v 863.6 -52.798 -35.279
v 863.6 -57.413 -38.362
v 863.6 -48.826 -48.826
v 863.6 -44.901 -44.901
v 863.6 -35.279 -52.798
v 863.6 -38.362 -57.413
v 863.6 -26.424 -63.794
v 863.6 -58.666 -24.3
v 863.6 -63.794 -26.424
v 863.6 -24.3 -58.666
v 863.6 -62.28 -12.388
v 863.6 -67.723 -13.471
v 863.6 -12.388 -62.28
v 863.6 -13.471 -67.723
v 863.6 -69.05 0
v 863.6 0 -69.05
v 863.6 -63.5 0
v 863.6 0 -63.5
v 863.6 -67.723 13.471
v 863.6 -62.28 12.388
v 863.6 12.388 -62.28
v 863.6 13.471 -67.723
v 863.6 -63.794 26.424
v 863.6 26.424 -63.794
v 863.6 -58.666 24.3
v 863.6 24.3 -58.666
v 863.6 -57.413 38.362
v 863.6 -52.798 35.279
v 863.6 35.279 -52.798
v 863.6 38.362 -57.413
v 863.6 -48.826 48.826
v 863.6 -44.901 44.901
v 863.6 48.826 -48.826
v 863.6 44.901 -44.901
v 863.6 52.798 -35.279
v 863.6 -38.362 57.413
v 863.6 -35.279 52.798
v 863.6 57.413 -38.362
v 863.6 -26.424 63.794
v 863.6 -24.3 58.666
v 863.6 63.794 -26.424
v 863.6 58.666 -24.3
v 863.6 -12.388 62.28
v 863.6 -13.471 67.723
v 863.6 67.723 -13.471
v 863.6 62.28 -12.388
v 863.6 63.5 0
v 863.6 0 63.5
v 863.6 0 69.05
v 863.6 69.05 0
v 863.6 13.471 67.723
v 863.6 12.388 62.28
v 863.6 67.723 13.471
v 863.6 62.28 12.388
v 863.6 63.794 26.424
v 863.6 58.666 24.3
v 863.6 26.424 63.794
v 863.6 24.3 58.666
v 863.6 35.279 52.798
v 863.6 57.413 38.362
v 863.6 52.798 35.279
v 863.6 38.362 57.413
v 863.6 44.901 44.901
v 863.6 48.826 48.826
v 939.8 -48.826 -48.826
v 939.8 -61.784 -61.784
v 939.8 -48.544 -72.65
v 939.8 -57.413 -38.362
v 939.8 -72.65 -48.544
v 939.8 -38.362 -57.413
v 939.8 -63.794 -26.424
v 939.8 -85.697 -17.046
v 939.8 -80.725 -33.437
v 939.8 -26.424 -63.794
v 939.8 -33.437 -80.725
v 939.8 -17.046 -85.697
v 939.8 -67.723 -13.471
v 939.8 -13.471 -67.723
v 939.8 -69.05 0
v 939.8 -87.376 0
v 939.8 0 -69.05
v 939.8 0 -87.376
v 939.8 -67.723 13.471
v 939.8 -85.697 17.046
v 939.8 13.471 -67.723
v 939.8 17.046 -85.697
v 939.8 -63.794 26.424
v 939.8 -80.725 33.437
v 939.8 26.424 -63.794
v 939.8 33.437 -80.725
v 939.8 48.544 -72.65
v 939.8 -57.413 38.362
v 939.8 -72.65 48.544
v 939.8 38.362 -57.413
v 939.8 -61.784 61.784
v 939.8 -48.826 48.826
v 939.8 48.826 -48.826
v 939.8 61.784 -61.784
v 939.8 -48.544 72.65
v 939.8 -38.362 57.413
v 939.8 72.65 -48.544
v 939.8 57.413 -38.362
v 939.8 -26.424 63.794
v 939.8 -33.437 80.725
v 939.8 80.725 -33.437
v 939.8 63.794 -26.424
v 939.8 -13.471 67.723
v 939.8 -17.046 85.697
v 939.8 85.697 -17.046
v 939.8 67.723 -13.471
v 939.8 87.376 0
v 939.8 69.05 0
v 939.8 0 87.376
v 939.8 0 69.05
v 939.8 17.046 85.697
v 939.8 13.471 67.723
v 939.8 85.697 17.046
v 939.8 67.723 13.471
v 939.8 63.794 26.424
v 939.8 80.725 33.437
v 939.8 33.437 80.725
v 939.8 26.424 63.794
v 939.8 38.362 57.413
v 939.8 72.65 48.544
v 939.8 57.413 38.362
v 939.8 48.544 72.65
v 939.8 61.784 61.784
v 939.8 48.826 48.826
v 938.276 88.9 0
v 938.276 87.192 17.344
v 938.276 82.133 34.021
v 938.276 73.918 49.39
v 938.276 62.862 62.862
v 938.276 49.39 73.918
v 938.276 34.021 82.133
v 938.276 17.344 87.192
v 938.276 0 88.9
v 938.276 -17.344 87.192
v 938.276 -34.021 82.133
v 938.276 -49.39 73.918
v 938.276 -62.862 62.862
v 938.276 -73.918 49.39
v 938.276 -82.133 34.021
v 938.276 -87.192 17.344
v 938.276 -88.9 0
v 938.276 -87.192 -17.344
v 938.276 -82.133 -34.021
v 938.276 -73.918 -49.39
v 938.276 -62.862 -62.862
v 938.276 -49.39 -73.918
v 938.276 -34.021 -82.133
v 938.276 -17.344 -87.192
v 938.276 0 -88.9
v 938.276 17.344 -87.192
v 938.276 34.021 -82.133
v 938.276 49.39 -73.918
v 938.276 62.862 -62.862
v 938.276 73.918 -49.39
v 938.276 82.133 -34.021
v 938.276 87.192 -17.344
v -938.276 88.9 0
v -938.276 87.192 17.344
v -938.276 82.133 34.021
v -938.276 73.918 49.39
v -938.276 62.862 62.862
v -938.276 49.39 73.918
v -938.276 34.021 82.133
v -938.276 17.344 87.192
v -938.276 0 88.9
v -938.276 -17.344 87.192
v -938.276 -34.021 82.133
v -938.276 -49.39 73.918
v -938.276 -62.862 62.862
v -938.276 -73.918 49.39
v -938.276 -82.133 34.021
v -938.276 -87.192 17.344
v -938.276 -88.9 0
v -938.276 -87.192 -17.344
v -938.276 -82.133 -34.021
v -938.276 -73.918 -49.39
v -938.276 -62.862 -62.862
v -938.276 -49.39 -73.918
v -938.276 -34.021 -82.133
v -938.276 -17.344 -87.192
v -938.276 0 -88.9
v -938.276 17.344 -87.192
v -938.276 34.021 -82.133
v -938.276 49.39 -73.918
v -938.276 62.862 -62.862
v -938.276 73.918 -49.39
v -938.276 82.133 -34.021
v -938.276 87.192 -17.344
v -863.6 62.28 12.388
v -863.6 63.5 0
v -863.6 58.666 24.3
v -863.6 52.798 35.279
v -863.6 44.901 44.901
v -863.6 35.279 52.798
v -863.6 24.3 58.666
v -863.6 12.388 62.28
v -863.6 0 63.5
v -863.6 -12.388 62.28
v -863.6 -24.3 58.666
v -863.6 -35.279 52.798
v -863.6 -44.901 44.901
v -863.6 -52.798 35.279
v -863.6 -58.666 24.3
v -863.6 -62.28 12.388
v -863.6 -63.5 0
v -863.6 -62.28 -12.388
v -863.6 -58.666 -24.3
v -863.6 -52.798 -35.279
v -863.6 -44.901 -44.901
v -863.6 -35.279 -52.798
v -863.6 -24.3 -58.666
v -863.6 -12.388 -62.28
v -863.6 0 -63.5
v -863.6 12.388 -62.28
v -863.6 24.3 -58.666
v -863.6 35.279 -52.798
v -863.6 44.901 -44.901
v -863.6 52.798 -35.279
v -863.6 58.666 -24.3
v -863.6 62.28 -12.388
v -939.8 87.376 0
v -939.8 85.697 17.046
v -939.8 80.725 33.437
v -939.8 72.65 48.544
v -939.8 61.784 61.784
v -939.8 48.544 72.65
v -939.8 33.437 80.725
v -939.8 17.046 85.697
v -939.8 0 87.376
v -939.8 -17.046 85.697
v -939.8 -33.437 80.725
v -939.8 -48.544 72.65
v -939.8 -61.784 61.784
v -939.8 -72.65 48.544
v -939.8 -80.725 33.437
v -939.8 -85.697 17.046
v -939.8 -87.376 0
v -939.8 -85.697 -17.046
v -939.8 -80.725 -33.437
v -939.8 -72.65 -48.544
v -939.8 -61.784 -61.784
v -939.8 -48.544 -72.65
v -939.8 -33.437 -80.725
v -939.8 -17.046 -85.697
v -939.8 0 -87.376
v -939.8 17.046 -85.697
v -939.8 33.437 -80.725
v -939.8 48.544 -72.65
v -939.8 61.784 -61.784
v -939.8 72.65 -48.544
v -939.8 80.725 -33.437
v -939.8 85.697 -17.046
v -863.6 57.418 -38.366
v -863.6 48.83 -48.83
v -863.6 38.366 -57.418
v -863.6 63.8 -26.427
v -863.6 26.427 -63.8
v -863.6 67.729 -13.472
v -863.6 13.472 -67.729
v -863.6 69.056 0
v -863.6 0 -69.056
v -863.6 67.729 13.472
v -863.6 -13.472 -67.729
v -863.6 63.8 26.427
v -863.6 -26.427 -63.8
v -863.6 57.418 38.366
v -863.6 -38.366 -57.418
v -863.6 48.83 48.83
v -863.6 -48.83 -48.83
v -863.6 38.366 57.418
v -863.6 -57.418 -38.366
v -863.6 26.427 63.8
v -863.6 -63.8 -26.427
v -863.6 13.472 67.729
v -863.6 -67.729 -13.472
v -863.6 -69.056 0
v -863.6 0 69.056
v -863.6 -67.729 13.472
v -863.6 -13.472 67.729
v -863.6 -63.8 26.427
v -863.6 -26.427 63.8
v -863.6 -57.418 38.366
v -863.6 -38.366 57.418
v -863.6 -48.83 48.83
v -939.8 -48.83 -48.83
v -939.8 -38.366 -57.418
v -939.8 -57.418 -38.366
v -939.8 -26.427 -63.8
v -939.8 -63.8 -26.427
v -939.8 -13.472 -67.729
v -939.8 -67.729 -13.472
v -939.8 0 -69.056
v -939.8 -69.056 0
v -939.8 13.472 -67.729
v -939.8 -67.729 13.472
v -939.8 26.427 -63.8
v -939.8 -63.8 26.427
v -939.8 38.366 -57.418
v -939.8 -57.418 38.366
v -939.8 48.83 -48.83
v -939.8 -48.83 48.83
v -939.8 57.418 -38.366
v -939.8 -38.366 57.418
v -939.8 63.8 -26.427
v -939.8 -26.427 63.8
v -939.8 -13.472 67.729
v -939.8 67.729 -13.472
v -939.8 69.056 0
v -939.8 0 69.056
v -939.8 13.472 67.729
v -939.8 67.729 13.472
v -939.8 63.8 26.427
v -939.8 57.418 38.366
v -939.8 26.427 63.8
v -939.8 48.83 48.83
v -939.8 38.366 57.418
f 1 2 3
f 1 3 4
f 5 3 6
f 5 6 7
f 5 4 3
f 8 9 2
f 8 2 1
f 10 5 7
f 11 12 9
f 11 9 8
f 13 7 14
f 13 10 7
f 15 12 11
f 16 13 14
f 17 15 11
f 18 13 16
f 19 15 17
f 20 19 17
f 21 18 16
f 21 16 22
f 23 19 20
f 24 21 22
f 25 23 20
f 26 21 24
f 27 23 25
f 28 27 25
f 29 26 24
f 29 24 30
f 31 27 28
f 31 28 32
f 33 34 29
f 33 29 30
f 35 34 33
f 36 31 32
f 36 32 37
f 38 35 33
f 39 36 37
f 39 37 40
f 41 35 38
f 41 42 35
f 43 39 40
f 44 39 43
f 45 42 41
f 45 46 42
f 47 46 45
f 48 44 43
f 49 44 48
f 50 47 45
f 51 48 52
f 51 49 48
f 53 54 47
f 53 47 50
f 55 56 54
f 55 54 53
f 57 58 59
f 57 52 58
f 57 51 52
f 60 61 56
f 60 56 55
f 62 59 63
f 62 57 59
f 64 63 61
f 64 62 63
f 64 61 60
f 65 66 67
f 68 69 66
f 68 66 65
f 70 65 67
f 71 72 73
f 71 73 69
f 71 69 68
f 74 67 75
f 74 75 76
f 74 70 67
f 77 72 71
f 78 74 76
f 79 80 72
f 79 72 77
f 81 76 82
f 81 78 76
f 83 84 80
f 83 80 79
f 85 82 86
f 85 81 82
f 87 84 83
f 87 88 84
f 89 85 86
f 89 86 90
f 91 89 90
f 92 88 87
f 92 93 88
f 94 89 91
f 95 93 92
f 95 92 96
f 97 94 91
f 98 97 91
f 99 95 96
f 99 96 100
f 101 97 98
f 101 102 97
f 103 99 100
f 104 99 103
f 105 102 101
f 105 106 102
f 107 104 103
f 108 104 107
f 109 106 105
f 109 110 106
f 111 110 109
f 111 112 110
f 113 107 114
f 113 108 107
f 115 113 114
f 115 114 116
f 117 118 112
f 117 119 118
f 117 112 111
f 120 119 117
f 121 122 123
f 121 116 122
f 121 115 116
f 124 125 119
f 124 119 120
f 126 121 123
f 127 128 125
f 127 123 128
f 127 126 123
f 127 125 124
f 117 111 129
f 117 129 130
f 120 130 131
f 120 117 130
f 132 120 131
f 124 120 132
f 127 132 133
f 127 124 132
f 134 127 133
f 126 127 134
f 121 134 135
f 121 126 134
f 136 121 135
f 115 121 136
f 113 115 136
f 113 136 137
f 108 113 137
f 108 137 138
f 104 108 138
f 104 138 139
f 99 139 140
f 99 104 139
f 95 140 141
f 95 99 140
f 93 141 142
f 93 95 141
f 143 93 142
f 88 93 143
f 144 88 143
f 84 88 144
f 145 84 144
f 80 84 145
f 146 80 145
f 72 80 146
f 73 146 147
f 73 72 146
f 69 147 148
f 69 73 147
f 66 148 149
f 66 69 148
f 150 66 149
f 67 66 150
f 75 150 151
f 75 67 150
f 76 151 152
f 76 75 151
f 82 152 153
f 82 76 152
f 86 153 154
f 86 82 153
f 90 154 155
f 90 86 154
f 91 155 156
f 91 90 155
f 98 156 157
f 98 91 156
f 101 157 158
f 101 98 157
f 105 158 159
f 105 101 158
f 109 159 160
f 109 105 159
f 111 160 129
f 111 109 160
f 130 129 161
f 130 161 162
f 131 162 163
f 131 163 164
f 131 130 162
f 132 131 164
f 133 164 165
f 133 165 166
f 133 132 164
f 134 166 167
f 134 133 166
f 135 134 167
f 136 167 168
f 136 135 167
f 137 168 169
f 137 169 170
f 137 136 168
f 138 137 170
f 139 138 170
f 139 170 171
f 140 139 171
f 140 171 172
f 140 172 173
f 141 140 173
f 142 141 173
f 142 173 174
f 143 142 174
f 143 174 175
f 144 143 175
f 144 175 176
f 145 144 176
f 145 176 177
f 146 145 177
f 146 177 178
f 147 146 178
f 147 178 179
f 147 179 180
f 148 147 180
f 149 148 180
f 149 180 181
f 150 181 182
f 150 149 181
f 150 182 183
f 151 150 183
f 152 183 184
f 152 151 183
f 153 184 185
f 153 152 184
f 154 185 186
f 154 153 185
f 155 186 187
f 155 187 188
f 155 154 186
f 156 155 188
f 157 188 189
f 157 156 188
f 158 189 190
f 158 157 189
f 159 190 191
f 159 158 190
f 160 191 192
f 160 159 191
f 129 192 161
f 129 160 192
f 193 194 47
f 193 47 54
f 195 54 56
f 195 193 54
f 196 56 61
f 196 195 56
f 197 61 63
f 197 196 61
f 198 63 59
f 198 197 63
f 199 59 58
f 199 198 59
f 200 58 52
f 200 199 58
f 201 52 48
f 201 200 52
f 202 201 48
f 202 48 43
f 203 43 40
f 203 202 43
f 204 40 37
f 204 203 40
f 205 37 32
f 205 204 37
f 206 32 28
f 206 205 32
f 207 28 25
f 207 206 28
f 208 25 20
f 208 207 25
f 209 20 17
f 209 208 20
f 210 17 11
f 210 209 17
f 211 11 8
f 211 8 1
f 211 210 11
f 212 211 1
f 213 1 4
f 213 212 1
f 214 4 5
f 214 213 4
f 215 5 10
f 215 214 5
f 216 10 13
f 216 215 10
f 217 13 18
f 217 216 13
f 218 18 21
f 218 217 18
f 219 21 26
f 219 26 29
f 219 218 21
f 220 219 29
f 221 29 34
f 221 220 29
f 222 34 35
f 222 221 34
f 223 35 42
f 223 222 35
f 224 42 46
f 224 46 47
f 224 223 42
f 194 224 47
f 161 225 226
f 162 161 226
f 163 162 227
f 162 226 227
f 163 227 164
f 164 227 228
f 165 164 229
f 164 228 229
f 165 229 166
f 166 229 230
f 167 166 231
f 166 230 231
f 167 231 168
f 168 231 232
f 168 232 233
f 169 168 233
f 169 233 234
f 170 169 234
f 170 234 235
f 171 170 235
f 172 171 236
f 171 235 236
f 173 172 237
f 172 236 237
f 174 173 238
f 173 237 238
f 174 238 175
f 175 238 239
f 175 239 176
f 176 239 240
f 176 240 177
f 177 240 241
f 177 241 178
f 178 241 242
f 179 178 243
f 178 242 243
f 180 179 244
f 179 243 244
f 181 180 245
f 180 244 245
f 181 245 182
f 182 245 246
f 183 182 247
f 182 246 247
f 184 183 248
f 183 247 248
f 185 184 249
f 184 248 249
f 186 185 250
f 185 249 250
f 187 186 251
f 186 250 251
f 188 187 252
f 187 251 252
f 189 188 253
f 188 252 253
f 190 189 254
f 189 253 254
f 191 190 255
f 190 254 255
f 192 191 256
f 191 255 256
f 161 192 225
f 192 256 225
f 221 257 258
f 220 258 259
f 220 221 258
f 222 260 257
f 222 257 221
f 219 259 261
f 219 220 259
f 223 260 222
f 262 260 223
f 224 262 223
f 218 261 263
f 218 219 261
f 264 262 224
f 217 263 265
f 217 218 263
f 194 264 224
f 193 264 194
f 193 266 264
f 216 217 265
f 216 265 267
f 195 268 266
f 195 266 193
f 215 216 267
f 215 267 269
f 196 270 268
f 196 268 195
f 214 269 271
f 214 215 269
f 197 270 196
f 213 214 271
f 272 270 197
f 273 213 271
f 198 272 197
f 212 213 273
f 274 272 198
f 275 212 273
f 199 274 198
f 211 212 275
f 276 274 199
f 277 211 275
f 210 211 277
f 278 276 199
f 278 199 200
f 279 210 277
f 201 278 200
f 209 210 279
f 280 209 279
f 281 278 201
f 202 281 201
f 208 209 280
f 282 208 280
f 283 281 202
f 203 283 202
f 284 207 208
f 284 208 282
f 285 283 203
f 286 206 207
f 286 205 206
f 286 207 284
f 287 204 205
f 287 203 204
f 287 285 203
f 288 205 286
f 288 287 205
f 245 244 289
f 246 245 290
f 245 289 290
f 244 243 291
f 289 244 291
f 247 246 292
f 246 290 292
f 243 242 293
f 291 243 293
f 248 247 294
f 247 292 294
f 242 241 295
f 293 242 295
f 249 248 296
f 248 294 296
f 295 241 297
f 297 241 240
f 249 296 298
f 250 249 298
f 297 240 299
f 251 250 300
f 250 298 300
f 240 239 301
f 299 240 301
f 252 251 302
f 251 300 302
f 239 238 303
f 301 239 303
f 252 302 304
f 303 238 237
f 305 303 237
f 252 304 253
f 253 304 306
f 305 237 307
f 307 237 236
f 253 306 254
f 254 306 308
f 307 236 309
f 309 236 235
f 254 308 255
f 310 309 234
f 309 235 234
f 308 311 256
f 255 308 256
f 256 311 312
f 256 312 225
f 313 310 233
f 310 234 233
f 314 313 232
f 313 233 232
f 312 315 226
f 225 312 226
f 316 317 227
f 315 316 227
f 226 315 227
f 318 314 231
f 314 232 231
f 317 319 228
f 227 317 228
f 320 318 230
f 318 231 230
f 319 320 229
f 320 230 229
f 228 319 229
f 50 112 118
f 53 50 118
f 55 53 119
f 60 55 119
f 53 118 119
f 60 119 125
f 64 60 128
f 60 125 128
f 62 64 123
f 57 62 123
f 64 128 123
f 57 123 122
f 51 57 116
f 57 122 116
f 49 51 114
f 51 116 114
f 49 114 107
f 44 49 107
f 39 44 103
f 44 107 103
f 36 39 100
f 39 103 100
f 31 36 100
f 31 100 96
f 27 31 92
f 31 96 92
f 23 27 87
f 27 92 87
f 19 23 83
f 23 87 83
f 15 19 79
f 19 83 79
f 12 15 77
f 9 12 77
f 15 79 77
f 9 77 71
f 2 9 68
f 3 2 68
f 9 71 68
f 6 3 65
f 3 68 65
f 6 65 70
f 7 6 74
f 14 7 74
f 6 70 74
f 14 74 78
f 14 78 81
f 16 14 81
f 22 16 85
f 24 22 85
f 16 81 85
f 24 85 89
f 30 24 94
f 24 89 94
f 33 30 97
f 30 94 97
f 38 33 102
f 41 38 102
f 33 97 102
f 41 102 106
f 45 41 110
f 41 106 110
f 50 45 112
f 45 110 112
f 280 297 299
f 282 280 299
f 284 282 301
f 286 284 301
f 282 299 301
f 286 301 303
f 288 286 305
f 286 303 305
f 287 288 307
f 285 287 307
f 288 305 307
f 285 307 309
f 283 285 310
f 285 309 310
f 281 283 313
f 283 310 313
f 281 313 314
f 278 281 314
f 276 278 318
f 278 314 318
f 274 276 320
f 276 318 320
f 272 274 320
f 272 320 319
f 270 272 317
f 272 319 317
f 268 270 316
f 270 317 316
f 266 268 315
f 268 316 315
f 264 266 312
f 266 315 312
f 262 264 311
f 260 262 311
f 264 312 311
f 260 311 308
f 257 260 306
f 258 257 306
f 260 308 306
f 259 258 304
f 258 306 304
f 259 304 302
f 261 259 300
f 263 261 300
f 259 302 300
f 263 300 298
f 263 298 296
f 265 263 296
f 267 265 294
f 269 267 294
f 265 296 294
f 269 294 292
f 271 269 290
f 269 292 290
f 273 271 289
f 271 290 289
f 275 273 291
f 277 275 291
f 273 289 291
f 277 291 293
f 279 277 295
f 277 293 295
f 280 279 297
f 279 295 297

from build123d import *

# Parameters (mm, degrees)
F0_R     = 88.9
F0_R_2   = 63.5
F1_DEPTH = 939.8
F2_R     = 69.0499
F2_R_2   = 63.5
F3_DEPTH = 76.2
F4_R     = 69.05625
F5_DEPTH = 76.2
F6_SIZE  = 1.524


with BuildPart() as f1:
    # F0 (on Right) → F1 (new body, symmetric)
    with BuildSketch(Plane.YZ):
        Circle(F0_R)
        Circle(F0_R_2, mode=Mode.SUBTRACT)
    extrude(amount=F1_DEPTH, both=True)

    # F2 (on face) → F3 (cut)
    with BuildSketch(Plane.YZ.offset(939.8)):
        Circle(F2_R)
        Circle(F2_R_2, mode=Mode.SUBTRACT)
    extrude(amount=-F3_DEPTH, mode=Mode.SUBTRACT)

    # F4 (on face) → F5 (cut)
    with BuildSketch(Plane(origin=(-939.8, 0, 0), x_dir=(0, -1, 0), z_dir=(-1, 0, 0))):
        Circle(F4_R)
    extrude(amount=-F5_DEPTH, mode=Mode.SUBTRACT)

    # F6
    f6_edges = [f1.edges().sort_by_distance(p)[0] for p in [
        (-939.8, -88.9, 0),
        (939.8, -88.9, 0),
    ]]
    chamfer(f6_edges, length=F6_SIZE)


solid = f1.part
